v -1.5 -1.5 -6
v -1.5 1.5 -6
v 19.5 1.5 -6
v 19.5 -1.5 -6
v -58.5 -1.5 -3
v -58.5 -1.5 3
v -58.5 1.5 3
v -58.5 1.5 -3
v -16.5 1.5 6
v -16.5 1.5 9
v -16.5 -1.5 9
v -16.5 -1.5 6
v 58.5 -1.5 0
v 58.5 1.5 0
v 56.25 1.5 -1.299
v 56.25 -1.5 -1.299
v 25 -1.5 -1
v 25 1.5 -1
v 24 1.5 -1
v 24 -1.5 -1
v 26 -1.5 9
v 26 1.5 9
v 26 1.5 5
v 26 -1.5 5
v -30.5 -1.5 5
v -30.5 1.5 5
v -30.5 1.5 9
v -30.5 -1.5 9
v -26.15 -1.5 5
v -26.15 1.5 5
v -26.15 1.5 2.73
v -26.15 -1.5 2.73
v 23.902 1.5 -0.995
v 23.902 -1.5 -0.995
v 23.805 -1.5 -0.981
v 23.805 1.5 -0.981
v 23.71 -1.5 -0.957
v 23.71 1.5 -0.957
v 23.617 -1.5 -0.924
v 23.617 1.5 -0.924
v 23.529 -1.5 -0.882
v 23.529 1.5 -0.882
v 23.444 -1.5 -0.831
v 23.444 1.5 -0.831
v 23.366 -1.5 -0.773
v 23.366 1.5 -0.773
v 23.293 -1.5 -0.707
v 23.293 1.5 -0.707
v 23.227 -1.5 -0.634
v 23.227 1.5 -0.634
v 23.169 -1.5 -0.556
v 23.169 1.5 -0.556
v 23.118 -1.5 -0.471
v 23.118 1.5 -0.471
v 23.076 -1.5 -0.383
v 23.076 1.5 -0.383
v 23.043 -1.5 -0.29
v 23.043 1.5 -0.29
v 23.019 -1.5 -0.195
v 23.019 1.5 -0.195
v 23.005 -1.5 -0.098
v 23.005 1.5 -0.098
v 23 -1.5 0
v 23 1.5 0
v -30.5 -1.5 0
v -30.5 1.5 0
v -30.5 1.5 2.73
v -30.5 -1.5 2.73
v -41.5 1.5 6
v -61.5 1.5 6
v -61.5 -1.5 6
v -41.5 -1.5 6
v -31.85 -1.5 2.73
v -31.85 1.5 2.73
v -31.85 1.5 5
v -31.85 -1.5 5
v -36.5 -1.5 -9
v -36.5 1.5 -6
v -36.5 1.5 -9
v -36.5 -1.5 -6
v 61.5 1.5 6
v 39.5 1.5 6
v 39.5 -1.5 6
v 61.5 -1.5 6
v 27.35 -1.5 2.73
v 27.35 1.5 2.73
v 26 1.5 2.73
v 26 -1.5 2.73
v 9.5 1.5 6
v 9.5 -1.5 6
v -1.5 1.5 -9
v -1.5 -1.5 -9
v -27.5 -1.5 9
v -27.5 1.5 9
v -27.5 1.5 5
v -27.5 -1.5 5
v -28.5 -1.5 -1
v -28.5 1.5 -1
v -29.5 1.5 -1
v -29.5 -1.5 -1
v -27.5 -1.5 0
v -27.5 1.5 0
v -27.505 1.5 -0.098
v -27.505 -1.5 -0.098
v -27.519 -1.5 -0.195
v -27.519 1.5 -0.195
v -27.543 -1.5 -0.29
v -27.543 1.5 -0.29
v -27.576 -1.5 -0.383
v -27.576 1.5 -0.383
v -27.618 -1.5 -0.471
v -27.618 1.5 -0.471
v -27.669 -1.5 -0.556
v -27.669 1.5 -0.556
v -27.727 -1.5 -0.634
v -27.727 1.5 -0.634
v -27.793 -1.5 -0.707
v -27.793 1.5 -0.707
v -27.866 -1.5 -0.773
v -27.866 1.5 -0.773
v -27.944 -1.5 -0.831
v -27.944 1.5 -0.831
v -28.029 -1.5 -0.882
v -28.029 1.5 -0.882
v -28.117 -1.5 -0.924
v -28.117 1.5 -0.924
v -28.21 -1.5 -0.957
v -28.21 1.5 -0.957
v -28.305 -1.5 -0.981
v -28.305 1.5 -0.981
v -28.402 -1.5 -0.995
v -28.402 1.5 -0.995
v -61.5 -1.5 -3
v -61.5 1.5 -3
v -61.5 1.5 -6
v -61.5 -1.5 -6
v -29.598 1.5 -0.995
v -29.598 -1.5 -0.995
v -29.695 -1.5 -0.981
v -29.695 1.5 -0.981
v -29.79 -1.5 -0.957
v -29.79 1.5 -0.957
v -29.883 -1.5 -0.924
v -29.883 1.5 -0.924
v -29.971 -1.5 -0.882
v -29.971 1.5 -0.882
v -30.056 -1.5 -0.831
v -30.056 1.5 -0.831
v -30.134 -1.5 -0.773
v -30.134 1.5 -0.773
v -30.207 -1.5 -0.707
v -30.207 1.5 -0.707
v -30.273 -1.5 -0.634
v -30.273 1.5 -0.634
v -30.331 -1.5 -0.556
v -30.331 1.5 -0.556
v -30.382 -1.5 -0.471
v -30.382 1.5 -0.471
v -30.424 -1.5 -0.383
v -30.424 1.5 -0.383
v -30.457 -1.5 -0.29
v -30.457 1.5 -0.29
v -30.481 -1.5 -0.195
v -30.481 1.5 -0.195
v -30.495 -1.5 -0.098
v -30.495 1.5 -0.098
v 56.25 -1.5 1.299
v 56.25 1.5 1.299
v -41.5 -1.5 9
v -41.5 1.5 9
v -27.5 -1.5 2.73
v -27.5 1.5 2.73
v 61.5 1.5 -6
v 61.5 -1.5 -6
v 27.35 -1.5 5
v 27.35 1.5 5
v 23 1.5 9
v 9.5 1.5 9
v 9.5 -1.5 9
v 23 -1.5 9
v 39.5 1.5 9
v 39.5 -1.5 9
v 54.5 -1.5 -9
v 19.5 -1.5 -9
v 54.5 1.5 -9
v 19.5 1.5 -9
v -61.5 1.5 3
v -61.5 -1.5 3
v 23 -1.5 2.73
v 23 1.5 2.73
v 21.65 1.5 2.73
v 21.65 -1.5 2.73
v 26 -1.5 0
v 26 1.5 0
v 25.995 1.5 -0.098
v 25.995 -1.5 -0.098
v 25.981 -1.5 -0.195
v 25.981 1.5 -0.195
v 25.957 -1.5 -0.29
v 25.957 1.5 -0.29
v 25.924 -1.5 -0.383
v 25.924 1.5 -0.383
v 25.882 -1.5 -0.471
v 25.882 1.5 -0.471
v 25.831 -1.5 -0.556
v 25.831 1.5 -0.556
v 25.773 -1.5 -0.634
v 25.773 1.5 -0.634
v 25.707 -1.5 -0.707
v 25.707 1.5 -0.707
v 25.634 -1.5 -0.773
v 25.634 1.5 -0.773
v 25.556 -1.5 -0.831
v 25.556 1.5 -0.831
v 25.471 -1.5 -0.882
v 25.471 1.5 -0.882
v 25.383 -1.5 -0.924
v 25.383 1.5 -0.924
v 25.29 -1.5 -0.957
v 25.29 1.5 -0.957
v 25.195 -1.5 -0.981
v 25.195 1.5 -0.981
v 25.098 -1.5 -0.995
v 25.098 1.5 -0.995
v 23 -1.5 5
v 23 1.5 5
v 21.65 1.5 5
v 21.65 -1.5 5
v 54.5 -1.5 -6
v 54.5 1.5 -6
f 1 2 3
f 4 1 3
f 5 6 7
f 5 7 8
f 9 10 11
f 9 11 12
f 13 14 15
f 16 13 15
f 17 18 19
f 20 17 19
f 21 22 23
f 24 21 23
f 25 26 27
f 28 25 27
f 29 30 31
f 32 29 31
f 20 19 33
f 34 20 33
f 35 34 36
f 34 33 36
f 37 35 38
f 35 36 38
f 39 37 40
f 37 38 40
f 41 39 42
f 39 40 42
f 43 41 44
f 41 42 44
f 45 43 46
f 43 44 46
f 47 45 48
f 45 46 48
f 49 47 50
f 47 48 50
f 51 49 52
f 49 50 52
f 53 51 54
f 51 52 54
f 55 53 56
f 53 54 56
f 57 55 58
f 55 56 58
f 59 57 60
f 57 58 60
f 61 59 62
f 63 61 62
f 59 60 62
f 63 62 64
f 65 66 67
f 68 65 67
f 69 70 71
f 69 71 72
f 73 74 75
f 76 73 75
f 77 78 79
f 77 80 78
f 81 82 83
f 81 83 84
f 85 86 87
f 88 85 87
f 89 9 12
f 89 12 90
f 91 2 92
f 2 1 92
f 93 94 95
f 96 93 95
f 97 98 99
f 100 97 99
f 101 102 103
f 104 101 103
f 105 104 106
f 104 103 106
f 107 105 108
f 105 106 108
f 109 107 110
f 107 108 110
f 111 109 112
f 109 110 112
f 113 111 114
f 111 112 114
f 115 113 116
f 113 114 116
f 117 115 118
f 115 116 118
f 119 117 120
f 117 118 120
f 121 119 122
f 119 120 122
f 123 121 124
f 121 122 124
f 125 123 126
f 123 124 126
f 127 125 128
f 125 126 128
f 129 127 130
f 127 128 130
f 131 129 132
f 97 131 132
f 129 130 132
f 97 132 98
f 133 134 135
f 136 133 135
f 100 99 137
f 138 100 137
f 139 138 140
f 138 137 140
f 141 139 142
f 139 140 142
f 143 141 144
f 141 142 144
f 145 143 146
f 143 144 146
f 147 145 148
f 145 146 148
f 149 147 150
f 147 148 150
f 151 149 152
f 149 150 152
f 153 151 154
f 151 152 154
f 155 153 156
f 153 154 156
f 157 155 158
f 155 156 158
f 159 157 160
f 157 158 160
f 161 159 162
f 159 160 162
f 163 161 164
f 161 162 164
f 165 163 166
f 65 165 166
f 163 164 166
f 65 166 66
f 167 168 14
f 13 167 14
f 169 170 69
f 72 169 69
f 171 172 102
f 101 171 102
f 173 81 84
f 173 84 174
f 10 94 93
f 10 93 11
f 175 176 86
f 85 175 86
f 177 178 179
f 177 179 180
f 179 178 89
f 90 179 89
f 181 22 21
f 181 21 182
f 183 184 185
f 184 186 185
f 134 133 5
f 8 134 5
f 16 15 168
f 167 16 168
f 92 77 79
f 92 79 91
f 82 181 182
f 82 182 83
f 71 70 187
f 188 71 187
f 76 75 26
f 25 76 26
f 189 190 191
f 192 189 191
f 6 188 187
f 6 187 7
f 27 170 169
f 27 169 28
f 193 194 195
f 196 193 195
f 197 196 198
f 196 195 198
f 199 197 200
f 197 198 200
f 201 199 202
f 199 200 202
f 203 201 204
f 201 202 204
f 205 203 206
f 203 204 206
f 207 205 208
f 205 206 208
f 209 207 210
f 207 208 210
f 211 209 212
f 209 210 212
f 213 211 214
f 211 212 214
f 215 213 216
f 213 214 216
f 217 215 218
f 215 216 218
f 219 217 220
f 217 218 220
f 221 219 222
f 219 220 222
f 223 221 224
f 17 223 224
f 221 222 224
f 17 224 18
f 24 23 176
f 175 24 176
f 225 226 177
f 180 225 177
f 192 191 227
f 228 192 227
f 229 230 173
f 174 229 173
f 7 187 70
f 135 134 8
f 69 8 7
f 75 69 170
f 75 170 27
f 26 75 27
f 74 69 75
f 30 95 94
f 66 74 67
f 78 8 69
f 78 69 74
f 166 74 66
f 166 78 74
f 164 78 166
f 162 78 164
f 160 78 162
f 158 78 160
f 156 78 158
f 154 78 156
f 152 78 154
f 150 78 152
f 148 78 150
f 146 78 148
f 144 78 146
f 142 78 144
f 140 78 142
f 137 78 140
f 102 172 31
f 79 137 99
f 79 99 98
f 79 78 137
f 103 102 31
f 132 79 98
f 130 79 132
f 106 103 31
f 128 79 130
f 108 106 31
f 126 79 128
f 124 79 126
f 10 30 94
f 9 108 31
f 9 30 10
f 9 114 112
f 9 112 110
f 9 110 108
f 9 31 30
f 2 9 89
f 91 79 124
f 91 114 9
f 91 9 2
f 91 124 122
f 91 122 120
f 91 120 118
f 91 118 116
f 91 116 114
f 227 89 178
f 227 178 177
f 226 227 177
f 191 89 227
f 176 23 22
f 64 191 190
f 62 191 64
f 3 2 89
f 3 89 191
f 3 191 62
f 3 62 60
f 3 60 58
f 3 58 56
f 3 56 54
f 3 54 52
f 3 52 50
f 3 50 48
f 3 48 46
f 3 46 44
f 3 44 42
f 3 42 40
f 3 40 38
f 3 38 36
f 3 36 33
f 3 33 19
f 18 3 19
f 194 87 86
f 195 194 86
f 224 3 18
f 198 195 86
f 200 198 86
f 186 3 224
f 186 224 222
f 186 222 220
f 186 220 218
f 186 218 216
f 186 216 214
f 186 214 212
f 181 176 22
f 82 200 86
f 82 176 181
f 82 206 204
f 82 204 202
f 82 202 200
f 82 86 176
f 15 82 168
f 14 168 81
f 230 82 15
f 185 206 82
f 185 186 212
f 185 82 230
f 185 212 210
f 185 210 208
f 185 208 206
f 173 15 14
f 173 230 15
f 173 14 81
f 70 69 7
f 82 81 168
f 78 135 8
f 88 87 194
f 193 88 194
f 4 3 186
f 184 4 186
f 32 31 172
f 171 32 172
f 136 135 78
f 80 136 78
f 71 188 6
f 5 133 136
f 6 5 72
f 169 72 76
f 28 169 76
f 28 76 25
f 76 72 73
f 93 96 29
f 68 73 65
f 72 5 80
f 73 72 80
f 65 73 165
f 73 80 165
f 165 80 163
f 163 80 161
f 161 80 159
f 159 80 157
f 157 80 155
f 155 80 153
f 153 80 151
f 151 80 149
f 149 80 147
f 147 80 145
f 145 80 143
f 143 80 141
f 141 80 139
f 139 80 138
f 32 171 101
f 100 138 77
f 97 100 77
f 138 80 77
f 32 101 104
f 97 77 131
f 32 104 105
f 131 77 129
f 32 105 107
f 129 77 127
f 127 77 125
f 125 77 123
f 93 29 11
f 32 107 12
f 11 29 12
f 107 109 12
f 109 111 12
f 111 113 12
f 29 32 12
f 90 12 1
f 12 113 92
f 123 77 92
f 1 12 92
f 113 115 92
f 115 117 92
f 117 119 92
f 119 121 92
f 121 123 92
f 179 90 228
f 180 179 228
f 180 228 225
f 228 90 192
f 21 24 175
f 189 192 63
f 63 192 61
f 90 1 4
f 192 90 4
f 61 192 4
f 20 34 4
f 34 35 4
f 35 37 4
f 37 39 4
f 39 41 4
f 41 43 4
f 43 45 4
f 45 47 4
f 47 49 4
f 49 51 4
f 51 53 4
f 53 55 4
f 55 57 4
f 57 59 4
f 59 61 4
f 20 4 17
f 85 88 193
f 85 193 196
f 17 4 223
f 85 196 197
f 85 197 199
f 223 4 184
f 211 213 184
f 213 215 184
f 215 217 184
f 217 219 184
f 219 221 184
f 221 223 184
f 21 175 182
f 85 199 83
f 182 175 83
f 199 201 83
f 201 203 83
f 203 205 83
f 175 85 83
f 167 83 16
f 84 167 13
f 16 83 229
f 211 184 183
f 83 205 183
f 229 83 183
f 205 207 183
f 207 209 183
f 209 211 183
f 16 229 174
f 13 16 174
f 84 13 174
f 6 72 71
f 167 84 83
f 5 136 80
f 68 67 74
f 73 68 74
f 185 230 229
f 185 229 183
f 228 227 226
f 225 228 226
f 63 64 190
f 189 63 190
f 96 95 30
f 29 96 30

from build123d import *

# Parameters (mm, degrees)
SKETCH1_W                = 123
SKETCH1_H                = 12
BOSS_EXTRUDE1_DEPTH      = 1.5
SKETCH2_W                = 30
SKETCH2_H                = 3
BOSS_EXTRUDE2_DEPTH      = 1.5
SKETCH12_W               = 25
SKETCH12_H               = 3
BOSS_EXTRUDE3_DEPTH      = 1.5
CUT_EXTRUDE8_DEPTH       = 2.5
CUT_EXTRUDE8_DEPTH_BACK  = 2.5
SKETCH13_W               = 35
SKETCH13_H               = 3
BOSS_EXTRUDE4_DEPTH      = 1.5
CUT_EXTRUDE10_DEPTH      = 2.5
CUT_EXTRUDE10_DEPTH_BACK = 2.5
SKETCH16_W               = 3
SKETCH16_H               = 6
CUT_EXTRUDE11_DEPTH      = 2.5
CUT_EXTRUDE11_DEPTH_BACK = 2.5


with BuildPart() as part:
    # Sketch1 → Boss-Extrude1 (new body, symmetric)
    with BuildSketch(Plane(origin=(0, 0, 0), x_dir=(1, 0, 0), z_dir=(0, 1, 0))):
        Rectangle(SKETCH1_W, SKETCH1_H)
    extrude(amount=BOSS_EXTRUDE1_DEPTH, both=True)

    # Sketch2 → Boss-Extrude2 (add, symmetric)
    with BuildSketch(Plane(origin=(0, 0, 0), x_dir=(1, 0, 0), z_dir=(0, 1, 0))):
        with Locations((24.5, -7.5)):
            Rectangle(SKETCH2_W, SKETCH2_H)
    extrude(amount=BOSS_EXTRUDE2_DEPTH, both=True)

    # Sketch12 → Boss-Extrude3 (add, symmetric)
    with BuildSketch(Plane(origin=(0, 0, 0), x_dir=(1, 0, 0), z_dir=(0, 1, 0))):
        with Locations((-29, -7.5)):
            Rectangle(SKETCH12_W, SKETCH12_H)
    extrude(amount=BOSS_EXTRUDE3_DEPTH, both=True)

    # Sketch11 → Cut-Extrude8 (cut, two sides)
    with BuildSketch(Plane(origin=(0, 0, 0), x_dir=(1, 0, 0), z_dir=(0, 1, 0))) as cut_extrude8_sk:
        with BuildLine():
            Line((-30.5, -9), (-27.5, -9))
            Line((-27.5, -9), (-27.5, -5))
            Line((-27.5, -5), (-26.15, -5))
            Line((-26.15, -5), (-26.15, -2.73))
            Line((-26.15, -2.73), (-27.5, -2.73))
            Line((-27.5, -2.73), (-27.5, 0))
            ThreePointArc((-27.5, 0), (-27.792893219, 0.707106781), (-28.5, 1))
            Line((-28.5, 1), (-29.5, 1))
            ThreePointArc((-29.5, 1), (-30.207106781, 0.707106781), (-30.5, 0))
            Line((-30.5, 0), (-30.5, -2.73))
            Line((-30.5, -2.73), (-31.85, -2.73))
            Line((-31.85, -2.73), (-31.85, -5))
            Line((-31.85, -5), (-30.5, -5))
            Line((-30.5, -5), (-30.5, -9))
        make_face()
        with BuildLine():
            Line((23, -9), (26, -9))
            Line((26, -9), (26, -5))
            Line((26, -5), (27.35, -5))
            Line((27.35, -5), (27.35, -2.73))
            Line((27.35, -2.73), (26, -2.73))
            Line((26, -2.73), (26, 0))
            ThreePointArc((26, 0), (25.707106781, 0.707106781), (25, 1))
            Line((25, 1), (24, 1))
            ThreePointArc((24, 1), (23.292893219, 0.707106781), (23, 0))
            Line((23, 0), (23, -2.73))
            Line((23, -2.73), (21.65, -2.73))
            Line((21.65, -2.73), (21.65, -5))
            Line((21.65, -5), (23, -5))
            Line((23, -5), (23, -9))
        make_face()
    extrude(amount=CUT_EXTRUDE8_DEPTH, mode=Mode.SUBTRACT)
    extrude(cut_extrude8_sk.sketch, amount=-CUT_EXTRUDE8_DEPTH_BACK, mode=Mode.SUBTRACT)

    # Sketch13 → Boss-Extrude4 (add, symmetric)
    with BuildSketch(Plane(origin=(0, 0, 0), x_dir=(1, 0, 0), z_dir=(0, 1, 0))):
        with Locations((-19, 7.5)):
            Rectangle(SKETCH13_W, SKETCH13_H)
        with Locations((37, 7.5)):
            Rectangle(SKETCH13_W, SKETCH13_H)
    extrude(amount=BOSS_EXTRUDE4_DEPTH, both=True)

    # Sketch15 → Cut-Extrude10 (cut, two sides)
    with BuildSketch(Plane(origin=(0, 0, 0), x_dir=(1, 0, 0), z_dir=(0, 1, 0))) as cut_extrude10_sk:
        Polygon((56.25, -1.299038106), (58.5, 0), (56.25, 1.299038106), align=None)
    extrude(amount=CUT_EXTRUDE10_DEPTH, mode=Mode.SUBTRACT)
    extrude(cut_extrude10_sk.sketch, amount=-CUT_EXTRUDE10_DEPTH_BACK, mode=Mode.SUBTRACT)

    # Sketch16 → Cut-Extrude11 (cut, two sides)
    with BuildSketch(Plane(origin=(0, 0, 0), x_dir=(1, 0, 0), z_dir=(0, 1, 0))) as cut_extrude11_sk:
        with Locations((-60, 0)):
            Rectangle(SKETCH16_W, SKETCH16_H)
    extrude(amount=CUT_EXTRUDE11_DEPTH, mode=Mode.SUBTRACT)
    extrude(cut_extrude11_sk.sketch, amount=-CUT_EXTRUDE11_DEPTH_BACK, mode=Mode.SUBTRACT)


solid = part.part
